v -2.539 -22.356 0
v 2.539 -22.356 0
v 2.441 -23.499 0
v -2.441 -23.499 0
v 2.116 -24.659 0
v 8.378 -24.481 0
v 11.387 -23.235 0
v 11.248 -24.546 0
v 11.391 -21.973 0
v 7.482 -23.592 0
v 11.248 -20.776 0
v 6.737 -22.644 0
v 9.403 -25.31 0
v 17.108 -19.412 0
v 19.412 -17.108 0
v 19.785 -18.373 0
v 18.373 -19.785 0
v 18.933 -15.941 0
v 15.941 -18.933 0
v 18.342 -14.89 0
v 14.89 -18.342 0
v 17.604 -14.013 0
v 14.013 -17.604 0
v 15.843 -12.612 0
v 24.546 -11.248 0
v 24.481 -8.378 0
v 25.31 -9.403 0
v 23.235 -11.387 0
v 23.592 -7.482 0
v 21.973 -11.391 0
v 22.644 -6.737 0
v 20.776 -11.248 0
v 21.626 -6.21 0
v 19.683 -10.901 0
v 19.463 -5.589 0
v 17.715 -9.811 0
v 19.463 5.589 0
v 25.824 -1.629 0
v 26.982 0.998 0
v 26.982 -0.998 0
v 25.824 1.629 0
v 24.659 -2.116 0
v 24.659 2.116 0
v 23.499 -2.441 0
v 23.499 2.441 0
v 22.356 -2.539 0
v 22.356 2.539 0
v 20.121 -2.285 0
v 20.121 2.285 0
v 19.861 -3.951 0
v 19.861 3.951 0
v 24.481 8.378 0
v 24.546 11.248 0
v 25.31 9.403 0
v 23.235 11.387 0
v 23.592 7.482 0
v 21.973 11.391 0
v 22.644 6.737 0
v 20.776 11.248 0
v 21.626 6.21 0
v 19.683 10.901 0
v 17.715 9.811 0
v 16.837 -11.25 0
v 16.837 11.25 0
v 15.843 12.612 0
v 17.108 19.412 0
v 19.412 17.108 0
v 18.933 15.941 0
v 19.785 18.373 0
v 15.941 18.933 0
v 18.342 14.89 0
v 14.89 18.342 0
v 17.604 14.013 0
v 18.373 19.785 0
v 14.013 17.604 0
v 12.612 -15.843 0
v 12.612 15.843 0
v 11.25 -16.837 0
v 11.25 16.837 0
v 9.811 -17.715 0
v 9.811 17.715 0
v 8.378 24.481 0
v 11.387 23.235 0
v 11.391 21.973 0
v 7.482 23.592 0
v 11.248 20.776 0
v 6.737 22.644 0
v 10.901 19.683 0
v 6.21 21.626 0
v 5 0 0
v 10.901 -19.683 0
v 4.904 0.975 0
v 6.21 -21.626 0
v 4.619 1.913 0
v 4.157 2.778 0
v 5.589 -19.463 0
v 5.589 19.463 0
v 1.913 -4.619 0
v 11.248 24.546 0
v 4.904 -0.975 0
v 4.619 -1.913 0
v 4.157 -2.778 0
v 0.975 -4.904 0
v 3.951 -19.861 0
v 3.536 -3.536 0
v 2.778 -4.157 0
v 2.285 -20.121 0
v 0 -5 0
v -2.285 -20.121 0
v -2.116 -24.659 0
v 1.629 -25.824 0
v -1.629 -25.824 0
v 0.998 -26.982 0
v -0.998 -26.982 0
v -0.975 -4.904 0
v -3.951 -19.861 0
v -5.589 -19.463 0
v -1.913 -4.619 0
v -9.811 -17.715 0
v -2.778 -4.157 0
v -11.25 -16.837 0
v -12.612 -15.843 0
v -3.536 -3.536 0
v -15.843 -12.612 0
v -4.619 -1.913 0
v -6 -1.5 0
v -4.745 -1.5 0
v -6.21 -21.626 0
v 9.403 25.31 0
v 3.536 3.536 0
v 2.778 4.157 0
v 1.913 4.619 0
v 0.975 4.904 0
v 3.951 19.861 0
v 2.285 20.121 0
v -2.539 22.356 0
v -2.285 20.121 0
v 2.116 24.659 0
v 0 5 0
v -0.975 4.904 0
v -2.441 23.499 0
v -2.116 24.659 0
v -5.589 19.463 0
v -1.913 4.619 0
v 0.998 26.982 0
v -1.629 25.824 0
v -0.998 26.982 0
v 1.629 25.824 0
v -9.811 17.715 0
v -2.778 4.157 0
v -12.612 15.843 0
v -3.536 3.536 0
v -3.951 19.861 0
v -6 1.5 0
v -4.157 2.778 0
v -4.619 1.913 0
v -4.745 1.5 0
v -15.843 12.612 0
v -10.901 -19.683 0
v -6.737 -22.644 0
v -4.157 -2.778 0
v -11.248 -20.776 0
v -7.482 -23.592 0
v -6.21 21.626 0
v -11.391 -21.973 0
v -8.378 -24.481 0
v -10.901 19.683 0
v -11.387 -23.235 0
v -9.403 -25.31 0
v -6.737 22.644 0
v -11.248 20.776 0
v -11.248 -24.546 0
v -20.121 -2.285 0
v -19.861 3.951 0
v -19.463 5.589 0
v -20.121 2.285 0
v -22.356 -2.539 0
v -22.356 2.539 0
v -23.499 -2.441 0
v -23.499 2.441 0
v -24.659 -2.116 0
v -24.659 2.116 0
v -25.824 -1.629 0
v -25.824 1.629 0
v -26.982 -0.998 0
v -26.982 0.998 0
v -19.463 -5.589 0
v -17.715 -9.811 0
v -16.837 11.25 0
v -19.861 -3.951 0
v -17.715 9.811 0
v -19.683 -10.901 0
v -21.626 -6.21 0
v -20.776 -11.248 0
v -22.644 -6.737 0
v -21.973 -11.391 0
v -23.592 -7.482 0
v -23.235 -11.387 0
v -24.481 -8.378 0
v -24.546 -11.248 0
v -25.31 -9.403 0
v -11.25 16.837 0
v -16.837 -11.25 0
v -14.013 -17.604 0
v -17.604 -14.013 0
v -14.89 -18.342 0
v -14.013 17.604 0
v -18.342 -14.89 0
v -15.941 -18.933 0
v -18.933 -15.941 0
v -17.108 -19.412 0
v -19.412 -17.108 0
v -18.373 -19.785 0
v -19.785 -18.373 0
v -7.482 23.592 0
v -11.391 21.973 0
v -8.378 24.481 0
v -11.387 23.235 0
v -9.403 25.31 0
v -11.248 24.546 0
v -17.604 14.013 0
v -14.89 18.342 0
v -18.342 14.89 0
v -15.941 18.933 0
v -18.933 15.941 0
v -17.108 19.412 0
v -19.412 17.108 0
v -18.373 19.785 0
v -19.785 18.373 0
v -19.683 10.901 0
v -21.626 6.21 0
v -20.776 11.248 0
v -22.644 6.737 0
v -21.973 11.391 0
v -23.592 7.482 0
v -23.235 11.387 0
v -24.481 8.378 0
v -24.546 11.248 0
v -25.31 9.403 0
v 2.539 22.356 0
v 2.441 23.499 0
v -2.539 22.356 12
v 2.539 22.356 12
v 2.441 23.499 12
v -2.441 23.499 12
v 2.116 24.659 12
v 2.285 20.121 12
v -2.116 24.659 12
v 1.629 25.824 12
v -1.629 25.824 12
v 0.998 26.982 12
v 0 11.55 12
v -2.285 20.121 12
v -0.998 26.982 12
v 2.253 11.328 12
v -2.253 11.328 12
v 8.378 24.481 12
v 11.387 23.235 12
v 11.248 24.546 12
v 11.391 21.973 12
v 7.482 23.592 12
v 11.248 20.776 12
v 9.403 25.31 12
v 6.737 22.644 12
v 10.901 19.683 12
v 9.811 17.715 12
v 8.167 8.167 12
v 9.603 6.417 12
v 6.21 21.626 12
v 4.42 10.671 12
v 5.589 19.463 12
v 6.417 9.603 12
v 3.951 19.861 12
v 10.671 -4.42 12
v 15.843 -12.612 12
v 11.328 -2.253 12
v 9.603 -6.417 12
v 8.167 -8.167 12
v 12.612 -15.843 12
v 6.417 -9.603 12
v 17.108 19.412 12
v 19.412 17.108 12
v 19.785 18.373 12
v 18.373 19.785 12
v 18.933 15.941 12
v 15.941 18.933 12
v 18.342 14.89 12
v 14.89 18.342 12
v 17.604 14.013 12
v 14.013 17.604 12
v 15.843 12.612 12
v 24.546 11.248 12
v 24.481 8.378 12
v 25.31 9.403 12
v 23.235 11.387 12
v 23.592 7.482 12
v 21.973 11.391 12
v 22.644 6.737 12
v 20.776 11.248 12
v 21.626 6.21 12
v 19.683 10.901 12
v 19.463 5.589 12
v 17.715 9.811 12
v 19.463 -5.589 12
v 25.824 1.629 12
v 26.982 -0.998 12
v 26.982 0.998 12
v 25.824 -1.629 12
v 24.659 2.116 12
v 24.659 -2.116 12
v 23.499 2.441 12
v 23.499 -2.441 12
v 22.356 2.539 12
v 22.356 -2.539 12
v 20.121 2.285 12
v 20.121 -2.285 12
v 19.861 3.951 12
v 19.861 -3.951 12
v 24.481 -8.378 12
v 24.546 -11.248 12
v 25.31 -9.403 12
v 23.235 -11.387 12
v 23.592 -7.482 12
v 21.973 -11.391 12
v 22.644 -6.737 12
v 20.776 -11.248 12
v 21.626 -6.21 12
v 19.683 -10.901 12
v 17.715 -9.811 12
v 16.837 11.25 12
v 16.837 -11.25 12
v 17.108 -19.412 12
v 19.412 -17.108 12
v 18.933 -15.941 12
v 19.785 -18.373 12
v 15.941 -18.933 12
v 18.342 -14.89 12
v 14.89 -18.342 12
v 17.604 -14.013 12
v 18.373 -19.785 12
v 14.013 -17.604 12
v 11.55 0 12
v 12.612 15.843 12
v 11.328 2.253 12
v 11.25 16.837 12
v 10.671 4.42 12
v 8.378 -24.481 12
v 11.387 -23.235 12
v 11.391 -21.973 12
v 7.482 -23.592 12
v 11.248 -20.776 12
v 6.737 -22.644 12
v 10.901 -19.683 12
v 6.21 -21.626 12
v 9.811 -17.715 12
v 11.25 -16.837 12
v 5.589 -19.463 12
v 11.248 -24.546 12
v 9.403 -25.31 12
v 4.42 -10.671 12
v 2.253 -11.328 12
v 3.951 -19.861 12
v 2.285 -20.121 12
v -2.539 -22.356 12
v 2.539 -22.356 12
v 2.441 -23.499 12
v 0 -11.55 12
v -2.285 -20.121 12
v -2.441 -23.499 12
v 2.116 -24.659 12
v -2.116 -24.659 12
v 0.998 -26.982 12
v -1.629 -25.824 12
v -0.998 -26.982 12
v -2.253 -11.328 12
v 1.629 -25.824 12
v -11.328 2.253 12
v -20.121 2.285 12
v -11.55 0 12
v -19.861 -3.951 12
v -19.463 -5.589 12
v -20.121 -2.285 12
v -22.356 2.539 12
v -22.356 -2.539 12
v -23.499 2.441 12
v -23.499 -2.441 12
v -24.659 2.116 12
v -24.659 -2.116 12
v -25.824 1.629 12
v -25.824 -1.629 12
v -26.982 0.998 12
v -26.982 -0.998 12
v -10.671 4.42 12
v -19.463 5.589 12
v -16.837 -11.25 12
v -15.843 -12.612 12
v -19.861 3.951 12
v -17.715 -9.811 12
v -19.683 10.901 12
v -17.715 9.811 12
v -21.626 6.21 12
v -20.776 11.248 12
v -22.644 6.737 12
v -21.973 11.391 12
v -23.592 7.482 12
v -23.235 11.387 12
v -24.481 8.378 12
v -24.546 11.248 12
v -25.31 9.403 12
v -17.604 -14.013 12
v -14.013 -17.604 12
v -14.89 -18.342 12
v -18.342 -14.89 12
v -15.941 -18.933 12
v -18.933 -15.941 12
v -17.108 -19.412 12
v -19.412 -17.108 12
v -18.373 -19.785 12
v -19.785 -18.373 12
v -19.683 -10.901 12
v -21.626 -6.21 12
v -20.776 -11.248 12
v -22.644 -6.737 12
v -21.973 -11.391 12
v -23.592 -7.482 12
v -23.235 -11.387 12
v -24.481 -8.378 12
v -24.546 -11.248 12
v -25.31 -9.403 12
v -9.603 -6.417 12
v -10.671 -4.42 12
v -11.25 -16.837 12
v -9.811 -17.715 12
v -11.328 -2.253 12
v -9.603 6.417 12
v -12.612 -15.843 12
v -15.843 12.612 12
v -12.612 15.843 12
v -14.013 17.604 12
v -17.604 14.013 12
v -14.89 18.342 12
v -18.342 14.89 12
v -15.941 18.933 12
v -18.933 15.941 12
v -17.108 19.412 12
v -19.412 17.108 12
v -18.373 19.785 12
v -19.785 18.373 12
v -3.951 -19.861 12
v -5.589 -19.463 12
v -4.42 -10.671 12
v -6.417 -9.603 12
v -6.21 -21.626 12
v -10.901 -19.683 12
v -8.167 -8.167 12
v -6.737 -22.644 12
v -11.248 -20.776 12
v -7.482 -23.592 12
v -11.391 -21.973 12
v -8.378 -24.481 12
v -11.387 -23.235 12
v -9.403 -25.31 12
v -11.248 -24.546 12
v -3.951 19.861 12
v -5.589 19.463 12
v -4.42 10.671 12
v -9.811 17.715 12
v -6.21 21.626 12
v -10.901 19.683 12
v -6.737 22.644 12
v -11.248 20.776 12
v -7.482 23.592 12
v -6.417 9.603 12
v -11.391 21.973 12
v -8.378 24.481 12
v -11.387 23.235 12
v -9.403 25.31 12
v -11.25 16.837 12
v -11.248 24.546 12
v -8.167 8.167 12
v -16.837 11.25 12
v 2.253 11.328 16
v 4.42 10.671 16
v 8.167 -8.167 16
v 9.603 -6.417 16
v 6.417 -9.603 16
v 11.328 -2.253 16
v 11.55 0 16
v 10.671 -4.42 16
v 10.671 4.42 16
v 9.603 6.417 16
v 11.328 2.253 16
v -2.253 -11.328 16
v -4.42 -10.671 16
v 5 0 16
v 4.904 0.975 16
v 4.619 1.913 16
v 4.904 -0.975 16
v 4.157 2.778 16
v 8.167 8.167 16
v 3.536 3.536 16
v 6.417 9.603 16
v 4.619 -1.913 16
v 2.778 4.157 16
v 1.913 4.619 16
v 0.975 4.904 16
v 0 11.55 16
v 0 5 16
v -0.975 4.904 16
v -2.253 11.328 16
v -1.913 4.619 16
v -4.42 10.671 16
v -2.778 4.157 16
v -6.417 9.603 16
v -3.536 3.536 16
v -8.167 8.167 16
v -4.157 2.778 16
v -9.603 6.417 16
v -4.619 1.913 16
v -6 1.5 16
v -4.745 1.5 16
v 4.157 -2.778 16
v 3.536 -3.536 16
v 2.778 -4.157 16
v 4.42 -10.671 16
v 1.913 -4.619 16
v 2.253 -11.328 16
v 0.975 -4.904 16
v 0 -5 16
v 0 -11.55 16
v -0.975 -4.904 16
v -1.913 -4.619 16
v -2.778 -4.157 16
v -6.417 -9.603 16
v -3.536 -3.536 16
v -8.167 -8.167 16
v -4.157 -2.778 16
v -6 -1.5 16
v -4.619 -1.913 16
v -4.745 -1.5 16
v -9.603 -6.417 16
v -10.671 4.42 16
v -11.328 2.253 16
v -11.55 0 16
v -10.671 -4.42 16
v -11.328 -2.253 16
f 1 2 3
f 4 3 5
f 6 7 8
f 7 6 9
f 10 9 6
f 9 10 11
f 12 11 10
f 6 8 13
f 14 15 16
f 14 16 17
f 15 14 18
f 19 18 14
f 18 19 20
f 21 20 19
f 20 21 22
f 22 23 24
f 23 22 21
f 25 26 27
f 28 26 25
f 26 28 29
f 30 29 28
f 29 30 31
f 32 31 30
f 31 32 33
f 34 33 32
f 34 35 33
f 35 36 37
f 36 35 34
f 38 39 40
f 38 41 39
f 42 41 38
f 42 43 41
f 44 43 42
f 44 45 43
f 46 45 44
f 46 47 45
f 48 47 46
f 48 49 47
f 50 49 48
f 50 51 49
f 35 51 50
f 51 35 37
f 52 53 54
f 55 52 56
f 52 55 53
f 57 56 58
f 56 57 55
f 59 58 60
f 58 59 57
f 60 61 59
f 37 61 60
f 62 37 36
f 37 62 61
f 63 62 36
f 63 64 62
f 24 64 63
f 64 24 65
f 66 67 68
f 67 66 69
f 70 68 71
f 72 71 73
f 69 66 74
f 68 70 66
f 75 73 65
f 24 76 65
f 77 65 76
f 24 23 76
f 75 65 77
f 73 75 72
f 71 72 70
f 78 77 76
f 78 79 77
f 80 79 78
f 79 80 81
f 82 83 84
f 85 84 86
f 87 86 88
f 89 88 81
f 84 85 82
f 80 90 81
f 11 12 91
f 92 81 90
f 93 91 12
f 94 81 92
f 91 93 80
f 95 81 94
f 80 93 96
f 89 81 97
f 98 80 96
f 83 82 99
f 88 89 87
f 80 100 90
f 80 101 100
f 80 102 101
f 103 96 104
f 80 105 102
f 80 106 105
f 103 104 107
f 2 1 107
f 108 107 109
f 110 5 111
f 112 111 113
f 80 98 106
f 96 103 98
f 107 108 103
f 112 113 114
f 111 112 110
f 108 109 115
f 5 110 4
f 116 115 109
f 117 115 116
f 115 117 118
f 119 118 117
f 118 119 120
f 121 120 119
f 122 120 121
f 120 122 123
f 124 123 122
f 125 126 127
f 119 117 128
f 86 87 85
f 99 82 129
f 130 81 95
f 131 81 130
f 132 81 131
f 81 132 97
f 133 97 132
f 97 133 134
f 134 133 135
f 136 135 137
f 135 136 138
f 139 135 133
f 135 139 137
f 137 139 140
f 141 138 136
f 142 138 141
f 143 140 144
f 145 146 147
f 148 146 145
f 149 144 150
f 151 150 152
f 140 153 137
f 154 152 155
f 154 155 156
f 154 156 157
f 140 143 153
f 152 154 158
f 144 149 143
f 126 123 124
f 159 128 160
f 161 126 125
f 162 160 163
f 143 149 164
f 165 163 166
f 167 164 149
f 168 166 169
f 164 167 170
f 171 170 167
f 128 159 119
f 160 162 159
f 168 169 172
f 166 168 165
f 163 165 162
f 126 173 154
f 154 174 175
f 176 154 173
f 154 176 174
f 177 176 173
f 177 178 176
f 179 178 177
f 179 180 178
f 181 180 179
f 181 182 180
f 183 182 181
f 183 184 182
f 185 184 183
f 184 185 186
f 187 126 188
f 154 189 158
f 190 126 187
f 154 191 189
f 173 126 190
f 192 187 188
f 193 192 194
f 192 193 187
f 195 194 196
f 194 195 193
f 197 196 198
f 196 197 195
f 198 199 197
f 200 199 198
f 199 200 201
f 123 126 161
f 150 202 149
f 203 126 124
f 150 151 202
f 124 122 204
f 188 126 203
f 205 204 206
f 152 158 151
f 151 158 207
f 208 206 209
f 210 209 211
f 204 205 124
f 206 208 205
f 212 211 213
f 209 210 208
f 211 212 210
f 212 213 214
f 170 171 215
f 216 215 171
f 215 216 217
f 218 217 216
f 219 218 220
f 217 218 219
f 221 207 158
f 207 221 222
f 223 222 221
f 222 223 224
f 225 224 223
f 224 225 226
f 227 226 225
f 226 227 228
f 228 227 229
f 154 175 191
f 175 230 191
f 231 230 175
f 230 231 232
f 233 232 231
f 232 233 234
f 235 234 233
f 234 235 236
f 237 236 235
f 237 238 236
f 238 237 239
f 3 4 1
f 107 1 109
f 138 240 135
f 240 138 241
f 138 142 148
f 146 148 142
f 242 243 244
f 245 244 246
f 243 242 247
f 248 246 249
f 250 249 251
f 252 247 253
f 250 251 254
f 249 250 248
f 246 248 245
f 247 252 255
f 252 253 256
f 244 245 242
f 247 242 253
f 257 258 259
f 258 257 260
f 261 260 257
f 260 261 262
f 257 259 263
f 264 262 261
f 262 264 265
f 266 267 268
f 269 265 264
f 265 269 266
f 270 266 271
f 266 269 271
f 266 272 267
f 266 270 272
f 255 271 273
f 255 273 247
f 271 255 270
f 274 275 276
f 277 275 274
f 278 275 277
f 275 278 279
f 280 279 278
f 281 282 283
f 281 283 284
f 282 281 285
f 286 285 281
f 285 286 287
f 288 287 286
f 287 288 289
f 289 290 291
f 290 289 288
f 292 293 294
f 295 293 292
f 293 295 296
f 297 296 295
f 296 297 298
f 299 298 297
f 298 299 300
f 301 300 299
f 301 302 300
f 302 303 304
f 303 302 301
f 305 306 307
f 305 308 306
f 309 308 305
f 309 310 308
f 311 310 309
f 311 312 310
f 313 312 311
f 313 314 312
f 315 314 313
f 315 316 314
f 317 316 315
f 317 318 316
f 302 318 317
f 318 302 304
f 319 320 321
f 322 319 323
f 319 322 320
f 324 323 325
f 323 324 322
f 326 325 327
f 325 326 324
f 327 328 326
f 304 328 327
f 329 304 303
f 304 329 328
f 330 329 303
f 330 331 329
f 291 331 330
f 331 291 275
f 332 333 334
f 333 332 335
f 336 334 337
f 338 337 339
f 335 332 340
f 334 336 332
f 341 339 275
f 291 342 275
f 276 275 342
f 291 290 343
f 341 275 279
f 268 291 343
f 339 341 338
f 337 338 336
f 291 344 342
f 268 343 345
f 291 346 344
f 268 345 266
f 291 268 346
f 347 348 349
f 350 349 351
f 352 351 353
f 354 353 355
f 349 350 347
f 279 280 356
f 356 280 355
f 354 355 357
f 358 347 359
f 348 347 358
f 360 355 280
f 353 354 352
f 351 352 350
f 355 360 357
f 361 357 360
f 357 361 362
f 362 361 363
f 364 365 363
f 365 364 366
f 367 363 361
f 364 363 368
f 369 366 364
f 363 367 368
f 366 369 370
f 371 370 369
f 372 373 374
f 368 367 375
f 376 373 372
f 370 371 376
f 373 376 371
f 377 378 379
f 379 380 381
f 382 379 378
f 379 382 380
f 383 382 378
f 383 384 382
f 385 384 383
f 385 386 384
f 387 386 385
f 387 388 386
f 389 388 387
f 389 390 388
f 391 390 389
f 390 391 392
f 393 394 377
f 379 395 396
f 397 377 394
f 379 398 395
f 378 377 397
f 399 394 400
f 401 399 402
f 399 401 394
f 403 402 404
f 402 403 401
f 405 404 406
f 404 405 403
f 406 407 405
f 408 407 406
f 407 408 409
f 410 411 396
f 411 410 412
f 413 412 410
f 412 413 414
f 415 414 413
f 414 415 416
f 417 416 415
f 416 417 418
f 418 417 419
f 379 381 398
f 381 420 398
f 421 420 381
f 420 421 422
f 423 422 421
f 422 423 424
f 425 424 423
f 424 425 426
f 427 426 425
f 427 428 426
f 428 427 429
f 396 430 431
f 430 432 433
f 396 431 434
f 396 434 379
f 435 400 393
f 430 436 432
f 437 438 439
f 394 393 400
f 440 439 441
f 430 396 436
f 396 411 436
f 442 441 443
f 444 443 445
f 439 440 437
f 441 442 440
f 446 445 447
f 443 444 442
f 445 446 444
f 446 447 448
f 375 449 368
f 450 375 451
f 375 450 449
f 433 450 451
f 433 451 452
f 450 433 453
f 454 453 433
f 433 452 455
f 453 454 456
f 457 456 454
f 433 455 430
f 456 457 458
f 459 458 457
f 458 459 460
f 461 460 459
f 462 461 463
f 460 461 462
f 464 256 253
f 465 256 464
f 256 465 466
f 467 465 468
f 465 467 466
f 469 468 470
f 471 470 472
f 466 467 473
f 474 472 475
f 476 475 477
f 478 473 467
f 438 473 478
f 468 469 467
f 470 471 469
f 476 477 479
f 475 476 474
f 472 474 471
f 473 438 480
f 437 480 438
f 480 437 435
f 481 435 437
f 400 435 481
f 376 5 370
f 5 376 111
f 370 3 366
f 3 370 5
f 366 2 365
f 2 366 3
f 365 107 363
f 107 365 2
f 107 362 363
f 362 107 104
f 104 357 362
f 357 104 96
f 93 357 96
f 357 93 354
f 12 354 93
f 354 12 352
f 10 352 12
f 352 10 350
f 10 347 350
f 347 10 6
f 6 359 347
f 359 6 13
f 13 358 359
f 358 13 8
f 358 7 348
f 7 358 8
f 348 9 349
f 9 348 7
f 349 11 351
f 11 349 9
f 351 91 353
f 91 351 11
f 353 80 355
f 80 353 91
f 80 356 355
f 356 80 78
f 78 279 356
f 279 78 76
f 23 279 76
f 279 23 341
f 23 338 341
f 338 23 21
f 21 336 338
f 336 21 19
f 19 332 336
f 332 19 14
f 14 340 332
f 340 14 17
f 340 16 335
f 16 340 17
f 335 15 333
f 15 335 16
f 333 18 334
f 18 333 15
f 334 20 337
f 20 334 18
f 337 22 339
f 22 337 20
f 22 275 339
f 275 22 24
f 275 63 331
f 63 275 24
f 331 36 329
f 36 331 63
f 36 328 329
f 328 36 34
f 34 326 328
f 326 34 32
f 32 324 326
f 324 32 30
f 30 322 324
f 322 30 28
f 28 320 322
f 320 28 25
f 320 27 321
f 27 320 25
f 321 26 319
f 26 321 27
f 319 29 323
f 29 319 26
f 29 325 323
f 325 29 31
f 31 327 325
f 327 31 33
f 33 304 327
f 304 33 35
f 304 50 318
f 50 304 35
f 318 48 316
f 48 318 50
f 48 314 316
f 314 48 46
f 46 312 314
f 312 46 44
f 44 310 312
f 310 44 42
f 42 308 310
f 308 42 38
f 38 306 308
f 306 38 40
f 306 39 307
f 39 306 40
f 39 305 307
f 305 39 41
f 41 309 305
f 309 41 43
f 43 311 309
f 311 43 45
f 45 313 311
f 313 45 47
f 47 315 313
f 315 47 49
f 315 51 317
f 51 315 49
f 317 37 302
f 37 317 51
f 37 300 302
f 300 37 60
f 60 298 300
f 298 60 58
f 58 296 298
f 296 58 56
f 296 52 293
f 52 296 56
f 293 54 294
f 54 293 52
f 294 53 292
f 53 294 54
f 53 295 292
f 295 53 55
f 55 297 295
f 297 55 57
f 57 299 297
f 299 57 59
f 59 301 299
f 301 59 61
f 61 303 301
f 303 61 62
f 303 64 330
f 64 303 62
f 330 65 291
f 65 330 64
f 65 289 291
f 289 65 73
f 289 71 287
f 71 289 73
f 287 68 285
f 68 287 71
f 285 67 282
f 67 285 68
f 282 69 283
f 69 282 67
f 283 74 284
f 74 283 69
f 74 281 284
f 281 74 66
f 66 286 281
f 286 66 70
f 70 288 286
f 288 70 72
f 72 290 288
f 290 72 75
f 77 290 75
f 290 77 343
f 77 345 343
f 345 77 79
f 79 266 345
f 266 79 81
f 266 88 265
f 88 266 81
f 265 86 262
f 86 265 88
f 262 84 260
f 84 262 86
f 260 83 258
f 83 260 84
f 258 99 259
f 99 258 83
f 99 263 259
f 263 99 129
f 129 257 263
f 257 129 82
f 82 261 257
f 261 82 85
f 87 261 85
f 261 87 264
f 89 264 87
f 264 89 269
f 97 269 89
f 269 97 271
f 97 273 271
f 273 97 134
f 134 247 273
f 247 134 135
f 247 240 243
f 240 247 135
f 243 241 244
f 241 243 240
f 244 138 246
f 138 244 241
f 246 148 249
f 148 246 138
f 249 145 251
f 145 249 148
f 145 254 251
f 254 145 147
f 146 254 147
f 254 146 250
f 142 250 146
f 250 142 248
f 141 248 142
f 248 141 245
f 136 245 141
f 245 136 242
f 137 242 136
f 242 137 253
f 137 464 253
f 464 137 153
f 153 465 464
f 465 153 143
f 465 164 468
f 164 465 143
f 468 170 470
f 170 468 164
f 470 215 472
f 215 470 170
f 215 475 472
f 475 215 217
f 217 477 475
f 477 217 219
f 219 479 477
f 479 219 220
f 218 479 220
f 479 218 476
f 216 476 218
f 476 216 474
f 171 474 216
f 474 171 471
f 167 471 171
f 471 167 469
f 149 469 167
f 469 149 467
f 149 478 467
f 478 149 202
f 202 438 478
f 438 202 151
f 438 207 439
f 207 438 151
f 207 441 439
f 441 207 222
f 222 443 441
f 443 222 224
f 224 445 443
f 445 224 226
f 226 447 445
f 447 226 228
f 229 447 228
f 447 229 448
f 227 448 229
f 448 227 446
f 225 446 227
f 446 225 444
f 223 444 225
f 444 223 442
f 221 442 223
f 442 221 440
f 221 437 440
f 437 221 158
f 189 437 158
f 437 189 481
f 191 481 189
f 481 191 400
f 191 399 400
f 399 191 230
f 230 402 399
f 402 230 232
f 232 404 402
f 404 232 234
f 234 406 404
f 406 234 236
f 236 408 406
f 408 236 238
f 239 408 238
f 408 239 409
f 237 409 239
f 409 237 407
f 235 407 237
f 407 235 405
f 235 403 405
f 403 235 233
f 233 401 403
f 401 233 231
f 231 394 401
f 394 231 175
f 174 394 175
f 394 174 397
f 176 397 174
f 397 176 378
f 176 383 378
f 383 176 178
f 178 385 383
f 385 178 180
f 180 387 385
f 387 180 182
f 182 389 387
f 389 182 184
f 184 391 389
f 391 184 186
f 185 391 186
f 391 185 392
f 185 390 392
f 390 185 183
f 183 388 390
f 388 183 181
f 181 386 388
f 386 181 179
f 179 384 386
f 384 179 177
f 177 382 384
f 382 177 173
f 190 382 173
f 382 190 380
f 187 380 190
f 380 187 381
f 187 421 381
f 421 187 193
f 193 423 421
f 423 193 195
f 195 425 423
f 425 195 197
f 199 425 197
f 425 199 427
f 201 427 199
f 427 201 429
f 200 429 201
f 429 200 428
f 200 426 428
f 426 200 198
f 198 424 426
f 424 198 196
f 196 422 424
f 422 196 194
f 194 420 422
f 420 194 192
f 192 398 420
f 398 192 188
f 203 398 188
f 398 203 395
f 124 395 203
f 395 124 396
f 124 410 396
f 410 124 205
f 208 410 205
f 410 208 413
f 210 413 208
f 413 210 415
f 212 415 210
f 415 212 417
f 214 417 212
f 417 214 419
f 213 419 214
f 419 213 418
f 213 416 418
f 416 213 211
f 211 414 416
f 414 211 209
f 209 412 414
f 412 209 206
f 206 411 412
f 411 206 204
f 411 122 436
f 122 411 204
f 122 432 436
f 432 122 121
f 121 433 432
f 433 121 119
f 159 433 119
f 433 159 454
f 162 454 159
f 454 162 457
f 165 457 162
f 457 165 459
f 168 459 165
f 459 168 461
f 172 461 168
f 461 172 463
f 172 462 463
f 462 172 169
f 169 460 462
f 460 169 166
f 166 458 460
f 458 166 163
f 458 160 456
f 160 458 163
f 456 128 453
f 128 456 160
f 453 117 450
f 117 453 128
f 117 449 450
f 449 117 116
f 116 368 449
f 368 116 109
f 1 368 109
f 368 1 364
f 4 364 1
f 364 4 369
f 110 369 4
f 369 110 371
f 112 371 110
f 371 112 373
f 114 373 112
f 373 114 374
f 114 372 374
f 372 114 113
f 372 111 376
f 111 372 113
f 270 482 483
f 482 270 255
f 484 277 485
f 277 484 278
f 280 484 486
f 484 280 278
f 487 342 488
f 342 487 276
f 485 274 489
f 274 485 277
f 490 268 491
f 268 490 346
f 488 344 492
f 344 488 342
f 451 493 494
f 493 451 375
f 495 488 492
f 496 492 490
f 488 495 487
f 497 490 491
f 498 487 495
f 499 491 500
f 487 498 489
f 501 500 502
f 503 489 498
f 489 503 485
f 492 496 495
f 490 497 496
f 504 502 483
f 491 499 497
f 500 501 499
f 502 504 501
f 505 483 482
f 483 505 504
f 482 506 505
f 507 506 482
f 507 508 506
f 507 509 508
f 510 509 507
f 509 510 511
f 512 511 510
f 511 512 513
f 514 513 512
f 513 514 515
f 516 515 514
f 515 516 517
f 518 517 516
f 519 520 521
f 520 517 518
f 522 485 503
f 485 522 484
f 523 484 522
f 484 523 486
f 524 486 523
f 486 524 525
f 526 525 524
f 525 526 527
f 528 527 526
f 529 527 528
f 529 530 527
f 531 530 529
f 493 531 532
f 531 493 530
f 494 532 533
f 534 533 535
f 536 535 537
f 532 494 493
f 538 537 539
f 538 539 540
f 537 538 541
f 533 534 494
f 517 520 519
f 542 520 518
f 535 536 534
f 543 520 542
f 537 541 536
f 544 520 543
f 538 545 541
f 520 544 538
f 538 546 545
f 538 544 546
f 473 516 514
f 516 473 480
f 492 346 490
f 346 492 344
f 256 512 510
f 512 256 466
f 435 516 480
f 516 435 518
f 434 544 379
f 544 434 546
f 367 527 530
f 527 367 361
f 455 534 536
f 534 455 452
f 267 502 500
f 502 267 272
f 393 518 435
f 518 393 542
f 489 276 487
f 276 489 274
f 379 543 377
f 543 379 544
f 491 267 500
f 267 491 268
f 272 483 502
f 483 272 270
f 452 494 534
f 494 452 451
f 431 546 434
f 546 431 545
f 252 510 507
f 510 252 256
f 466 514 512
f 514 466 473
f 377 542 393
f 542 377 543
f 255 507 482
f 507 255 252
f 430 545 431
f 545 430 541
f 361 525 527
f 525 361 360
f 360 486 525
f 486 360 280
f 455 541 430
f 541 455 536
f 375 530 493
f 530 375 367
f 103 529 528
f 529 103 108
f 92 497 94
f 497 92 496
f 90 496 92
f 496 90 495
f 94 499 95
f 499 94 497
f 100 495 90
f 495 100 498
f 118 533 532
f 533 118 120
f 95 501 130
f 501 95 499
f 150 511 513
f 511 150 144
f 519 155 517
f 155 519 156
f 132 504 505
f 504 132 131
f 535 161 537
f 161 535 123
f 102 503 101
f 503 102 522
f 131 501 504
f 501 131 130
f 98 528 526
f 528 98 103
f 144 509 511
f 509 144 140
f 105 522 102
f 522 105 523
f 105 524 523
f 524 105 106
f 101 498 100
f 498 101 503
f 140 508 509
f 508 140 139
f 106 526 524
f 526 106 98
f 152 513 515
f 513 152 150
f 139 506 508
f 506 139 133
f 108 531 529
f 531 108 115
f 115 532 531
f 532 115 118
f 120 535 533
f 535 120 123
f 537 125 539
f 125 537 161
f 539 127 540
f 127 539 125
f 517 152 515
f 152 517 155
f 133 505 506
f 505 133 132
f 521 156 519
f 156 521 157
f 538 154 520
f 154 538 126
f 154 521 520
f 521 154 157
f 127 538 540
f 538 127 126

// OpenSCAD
$fn = 32;

// ----------------------------------------------------------------------
// Spur gear: m=3 z=16, 54 mm tip diameter x 16 mm
// ----------------------------------------------------------------------

// --- parameters (mm) ---
module_m = 3;             // module
teeth = 16;               // number of teeth
face_w = 12;              // face width
pa = 20;                  // pressure angle, deg
bore_d = 10;              // shaft bore
hub_d = 23.1;             // hub diameter
hub_h = 4;                // hub above the face
key_w = 3;                // keyway width
key_h = 1.4;              // keyway depth

/* --- involute profile --- */
pitch_r = module_m * teeth / 2;
base_r = pitch_r * cos(pa);
tip_r = pitch_r + module_m;
root_r = pitch_r - 1.25 * module_m;
flank_steps = 6;

function inv_deg(a) = (tan(a) - a * PI / 180) * 180 / PI;
function flank_r(i) = root_r + (tip_r - root_r) * i / flank_steps;
function half_angle(r) = 90 / teeth + inv_deg(pa) - inv_deg(acos(min(1, base_r / r)));
function tooth_pt(k, i, side) =
    let (r = flank_r(i), a = k * 360 / teeth + side * half_angle(r))
    [r * cos(a), r * sin(a)];

module tooth_profile() {
  polygon(points = [
    for (k = [0 : teeth - 1])
      each [
        for (i = [0 : flank_steps]) tooth_pt(k, i, -1),
        for (i = [flank_steps : -1 : 0]) tooth_pt(k, i, 1),
        let (ta = (k + 0.5) * 360 / teeth)
          [root_r * cos(ta), root_r * sin(ta)]
      ]
  ]);
}

module gear_disc() {
  linear_extrude(height = face_w) tooth_profile();
}

module hub_boss() {
  translate([0, 0, face_w - 1]) cylinder(h = hub_h + 1, d = hub_d);
}

difference() {
  union() {
    gear_disc();
    hub_boss();
  }
  translate([0, 0, -1]) cylinder(h = face_w + hub_h + 3, d = bore_d);
  /* keyway on the bore */
  translate([-bore_d / 2 - 1, -key_w / 2, -1]) cube([key_h + 1, key_w, face_w + hub_h + 3]);
}
